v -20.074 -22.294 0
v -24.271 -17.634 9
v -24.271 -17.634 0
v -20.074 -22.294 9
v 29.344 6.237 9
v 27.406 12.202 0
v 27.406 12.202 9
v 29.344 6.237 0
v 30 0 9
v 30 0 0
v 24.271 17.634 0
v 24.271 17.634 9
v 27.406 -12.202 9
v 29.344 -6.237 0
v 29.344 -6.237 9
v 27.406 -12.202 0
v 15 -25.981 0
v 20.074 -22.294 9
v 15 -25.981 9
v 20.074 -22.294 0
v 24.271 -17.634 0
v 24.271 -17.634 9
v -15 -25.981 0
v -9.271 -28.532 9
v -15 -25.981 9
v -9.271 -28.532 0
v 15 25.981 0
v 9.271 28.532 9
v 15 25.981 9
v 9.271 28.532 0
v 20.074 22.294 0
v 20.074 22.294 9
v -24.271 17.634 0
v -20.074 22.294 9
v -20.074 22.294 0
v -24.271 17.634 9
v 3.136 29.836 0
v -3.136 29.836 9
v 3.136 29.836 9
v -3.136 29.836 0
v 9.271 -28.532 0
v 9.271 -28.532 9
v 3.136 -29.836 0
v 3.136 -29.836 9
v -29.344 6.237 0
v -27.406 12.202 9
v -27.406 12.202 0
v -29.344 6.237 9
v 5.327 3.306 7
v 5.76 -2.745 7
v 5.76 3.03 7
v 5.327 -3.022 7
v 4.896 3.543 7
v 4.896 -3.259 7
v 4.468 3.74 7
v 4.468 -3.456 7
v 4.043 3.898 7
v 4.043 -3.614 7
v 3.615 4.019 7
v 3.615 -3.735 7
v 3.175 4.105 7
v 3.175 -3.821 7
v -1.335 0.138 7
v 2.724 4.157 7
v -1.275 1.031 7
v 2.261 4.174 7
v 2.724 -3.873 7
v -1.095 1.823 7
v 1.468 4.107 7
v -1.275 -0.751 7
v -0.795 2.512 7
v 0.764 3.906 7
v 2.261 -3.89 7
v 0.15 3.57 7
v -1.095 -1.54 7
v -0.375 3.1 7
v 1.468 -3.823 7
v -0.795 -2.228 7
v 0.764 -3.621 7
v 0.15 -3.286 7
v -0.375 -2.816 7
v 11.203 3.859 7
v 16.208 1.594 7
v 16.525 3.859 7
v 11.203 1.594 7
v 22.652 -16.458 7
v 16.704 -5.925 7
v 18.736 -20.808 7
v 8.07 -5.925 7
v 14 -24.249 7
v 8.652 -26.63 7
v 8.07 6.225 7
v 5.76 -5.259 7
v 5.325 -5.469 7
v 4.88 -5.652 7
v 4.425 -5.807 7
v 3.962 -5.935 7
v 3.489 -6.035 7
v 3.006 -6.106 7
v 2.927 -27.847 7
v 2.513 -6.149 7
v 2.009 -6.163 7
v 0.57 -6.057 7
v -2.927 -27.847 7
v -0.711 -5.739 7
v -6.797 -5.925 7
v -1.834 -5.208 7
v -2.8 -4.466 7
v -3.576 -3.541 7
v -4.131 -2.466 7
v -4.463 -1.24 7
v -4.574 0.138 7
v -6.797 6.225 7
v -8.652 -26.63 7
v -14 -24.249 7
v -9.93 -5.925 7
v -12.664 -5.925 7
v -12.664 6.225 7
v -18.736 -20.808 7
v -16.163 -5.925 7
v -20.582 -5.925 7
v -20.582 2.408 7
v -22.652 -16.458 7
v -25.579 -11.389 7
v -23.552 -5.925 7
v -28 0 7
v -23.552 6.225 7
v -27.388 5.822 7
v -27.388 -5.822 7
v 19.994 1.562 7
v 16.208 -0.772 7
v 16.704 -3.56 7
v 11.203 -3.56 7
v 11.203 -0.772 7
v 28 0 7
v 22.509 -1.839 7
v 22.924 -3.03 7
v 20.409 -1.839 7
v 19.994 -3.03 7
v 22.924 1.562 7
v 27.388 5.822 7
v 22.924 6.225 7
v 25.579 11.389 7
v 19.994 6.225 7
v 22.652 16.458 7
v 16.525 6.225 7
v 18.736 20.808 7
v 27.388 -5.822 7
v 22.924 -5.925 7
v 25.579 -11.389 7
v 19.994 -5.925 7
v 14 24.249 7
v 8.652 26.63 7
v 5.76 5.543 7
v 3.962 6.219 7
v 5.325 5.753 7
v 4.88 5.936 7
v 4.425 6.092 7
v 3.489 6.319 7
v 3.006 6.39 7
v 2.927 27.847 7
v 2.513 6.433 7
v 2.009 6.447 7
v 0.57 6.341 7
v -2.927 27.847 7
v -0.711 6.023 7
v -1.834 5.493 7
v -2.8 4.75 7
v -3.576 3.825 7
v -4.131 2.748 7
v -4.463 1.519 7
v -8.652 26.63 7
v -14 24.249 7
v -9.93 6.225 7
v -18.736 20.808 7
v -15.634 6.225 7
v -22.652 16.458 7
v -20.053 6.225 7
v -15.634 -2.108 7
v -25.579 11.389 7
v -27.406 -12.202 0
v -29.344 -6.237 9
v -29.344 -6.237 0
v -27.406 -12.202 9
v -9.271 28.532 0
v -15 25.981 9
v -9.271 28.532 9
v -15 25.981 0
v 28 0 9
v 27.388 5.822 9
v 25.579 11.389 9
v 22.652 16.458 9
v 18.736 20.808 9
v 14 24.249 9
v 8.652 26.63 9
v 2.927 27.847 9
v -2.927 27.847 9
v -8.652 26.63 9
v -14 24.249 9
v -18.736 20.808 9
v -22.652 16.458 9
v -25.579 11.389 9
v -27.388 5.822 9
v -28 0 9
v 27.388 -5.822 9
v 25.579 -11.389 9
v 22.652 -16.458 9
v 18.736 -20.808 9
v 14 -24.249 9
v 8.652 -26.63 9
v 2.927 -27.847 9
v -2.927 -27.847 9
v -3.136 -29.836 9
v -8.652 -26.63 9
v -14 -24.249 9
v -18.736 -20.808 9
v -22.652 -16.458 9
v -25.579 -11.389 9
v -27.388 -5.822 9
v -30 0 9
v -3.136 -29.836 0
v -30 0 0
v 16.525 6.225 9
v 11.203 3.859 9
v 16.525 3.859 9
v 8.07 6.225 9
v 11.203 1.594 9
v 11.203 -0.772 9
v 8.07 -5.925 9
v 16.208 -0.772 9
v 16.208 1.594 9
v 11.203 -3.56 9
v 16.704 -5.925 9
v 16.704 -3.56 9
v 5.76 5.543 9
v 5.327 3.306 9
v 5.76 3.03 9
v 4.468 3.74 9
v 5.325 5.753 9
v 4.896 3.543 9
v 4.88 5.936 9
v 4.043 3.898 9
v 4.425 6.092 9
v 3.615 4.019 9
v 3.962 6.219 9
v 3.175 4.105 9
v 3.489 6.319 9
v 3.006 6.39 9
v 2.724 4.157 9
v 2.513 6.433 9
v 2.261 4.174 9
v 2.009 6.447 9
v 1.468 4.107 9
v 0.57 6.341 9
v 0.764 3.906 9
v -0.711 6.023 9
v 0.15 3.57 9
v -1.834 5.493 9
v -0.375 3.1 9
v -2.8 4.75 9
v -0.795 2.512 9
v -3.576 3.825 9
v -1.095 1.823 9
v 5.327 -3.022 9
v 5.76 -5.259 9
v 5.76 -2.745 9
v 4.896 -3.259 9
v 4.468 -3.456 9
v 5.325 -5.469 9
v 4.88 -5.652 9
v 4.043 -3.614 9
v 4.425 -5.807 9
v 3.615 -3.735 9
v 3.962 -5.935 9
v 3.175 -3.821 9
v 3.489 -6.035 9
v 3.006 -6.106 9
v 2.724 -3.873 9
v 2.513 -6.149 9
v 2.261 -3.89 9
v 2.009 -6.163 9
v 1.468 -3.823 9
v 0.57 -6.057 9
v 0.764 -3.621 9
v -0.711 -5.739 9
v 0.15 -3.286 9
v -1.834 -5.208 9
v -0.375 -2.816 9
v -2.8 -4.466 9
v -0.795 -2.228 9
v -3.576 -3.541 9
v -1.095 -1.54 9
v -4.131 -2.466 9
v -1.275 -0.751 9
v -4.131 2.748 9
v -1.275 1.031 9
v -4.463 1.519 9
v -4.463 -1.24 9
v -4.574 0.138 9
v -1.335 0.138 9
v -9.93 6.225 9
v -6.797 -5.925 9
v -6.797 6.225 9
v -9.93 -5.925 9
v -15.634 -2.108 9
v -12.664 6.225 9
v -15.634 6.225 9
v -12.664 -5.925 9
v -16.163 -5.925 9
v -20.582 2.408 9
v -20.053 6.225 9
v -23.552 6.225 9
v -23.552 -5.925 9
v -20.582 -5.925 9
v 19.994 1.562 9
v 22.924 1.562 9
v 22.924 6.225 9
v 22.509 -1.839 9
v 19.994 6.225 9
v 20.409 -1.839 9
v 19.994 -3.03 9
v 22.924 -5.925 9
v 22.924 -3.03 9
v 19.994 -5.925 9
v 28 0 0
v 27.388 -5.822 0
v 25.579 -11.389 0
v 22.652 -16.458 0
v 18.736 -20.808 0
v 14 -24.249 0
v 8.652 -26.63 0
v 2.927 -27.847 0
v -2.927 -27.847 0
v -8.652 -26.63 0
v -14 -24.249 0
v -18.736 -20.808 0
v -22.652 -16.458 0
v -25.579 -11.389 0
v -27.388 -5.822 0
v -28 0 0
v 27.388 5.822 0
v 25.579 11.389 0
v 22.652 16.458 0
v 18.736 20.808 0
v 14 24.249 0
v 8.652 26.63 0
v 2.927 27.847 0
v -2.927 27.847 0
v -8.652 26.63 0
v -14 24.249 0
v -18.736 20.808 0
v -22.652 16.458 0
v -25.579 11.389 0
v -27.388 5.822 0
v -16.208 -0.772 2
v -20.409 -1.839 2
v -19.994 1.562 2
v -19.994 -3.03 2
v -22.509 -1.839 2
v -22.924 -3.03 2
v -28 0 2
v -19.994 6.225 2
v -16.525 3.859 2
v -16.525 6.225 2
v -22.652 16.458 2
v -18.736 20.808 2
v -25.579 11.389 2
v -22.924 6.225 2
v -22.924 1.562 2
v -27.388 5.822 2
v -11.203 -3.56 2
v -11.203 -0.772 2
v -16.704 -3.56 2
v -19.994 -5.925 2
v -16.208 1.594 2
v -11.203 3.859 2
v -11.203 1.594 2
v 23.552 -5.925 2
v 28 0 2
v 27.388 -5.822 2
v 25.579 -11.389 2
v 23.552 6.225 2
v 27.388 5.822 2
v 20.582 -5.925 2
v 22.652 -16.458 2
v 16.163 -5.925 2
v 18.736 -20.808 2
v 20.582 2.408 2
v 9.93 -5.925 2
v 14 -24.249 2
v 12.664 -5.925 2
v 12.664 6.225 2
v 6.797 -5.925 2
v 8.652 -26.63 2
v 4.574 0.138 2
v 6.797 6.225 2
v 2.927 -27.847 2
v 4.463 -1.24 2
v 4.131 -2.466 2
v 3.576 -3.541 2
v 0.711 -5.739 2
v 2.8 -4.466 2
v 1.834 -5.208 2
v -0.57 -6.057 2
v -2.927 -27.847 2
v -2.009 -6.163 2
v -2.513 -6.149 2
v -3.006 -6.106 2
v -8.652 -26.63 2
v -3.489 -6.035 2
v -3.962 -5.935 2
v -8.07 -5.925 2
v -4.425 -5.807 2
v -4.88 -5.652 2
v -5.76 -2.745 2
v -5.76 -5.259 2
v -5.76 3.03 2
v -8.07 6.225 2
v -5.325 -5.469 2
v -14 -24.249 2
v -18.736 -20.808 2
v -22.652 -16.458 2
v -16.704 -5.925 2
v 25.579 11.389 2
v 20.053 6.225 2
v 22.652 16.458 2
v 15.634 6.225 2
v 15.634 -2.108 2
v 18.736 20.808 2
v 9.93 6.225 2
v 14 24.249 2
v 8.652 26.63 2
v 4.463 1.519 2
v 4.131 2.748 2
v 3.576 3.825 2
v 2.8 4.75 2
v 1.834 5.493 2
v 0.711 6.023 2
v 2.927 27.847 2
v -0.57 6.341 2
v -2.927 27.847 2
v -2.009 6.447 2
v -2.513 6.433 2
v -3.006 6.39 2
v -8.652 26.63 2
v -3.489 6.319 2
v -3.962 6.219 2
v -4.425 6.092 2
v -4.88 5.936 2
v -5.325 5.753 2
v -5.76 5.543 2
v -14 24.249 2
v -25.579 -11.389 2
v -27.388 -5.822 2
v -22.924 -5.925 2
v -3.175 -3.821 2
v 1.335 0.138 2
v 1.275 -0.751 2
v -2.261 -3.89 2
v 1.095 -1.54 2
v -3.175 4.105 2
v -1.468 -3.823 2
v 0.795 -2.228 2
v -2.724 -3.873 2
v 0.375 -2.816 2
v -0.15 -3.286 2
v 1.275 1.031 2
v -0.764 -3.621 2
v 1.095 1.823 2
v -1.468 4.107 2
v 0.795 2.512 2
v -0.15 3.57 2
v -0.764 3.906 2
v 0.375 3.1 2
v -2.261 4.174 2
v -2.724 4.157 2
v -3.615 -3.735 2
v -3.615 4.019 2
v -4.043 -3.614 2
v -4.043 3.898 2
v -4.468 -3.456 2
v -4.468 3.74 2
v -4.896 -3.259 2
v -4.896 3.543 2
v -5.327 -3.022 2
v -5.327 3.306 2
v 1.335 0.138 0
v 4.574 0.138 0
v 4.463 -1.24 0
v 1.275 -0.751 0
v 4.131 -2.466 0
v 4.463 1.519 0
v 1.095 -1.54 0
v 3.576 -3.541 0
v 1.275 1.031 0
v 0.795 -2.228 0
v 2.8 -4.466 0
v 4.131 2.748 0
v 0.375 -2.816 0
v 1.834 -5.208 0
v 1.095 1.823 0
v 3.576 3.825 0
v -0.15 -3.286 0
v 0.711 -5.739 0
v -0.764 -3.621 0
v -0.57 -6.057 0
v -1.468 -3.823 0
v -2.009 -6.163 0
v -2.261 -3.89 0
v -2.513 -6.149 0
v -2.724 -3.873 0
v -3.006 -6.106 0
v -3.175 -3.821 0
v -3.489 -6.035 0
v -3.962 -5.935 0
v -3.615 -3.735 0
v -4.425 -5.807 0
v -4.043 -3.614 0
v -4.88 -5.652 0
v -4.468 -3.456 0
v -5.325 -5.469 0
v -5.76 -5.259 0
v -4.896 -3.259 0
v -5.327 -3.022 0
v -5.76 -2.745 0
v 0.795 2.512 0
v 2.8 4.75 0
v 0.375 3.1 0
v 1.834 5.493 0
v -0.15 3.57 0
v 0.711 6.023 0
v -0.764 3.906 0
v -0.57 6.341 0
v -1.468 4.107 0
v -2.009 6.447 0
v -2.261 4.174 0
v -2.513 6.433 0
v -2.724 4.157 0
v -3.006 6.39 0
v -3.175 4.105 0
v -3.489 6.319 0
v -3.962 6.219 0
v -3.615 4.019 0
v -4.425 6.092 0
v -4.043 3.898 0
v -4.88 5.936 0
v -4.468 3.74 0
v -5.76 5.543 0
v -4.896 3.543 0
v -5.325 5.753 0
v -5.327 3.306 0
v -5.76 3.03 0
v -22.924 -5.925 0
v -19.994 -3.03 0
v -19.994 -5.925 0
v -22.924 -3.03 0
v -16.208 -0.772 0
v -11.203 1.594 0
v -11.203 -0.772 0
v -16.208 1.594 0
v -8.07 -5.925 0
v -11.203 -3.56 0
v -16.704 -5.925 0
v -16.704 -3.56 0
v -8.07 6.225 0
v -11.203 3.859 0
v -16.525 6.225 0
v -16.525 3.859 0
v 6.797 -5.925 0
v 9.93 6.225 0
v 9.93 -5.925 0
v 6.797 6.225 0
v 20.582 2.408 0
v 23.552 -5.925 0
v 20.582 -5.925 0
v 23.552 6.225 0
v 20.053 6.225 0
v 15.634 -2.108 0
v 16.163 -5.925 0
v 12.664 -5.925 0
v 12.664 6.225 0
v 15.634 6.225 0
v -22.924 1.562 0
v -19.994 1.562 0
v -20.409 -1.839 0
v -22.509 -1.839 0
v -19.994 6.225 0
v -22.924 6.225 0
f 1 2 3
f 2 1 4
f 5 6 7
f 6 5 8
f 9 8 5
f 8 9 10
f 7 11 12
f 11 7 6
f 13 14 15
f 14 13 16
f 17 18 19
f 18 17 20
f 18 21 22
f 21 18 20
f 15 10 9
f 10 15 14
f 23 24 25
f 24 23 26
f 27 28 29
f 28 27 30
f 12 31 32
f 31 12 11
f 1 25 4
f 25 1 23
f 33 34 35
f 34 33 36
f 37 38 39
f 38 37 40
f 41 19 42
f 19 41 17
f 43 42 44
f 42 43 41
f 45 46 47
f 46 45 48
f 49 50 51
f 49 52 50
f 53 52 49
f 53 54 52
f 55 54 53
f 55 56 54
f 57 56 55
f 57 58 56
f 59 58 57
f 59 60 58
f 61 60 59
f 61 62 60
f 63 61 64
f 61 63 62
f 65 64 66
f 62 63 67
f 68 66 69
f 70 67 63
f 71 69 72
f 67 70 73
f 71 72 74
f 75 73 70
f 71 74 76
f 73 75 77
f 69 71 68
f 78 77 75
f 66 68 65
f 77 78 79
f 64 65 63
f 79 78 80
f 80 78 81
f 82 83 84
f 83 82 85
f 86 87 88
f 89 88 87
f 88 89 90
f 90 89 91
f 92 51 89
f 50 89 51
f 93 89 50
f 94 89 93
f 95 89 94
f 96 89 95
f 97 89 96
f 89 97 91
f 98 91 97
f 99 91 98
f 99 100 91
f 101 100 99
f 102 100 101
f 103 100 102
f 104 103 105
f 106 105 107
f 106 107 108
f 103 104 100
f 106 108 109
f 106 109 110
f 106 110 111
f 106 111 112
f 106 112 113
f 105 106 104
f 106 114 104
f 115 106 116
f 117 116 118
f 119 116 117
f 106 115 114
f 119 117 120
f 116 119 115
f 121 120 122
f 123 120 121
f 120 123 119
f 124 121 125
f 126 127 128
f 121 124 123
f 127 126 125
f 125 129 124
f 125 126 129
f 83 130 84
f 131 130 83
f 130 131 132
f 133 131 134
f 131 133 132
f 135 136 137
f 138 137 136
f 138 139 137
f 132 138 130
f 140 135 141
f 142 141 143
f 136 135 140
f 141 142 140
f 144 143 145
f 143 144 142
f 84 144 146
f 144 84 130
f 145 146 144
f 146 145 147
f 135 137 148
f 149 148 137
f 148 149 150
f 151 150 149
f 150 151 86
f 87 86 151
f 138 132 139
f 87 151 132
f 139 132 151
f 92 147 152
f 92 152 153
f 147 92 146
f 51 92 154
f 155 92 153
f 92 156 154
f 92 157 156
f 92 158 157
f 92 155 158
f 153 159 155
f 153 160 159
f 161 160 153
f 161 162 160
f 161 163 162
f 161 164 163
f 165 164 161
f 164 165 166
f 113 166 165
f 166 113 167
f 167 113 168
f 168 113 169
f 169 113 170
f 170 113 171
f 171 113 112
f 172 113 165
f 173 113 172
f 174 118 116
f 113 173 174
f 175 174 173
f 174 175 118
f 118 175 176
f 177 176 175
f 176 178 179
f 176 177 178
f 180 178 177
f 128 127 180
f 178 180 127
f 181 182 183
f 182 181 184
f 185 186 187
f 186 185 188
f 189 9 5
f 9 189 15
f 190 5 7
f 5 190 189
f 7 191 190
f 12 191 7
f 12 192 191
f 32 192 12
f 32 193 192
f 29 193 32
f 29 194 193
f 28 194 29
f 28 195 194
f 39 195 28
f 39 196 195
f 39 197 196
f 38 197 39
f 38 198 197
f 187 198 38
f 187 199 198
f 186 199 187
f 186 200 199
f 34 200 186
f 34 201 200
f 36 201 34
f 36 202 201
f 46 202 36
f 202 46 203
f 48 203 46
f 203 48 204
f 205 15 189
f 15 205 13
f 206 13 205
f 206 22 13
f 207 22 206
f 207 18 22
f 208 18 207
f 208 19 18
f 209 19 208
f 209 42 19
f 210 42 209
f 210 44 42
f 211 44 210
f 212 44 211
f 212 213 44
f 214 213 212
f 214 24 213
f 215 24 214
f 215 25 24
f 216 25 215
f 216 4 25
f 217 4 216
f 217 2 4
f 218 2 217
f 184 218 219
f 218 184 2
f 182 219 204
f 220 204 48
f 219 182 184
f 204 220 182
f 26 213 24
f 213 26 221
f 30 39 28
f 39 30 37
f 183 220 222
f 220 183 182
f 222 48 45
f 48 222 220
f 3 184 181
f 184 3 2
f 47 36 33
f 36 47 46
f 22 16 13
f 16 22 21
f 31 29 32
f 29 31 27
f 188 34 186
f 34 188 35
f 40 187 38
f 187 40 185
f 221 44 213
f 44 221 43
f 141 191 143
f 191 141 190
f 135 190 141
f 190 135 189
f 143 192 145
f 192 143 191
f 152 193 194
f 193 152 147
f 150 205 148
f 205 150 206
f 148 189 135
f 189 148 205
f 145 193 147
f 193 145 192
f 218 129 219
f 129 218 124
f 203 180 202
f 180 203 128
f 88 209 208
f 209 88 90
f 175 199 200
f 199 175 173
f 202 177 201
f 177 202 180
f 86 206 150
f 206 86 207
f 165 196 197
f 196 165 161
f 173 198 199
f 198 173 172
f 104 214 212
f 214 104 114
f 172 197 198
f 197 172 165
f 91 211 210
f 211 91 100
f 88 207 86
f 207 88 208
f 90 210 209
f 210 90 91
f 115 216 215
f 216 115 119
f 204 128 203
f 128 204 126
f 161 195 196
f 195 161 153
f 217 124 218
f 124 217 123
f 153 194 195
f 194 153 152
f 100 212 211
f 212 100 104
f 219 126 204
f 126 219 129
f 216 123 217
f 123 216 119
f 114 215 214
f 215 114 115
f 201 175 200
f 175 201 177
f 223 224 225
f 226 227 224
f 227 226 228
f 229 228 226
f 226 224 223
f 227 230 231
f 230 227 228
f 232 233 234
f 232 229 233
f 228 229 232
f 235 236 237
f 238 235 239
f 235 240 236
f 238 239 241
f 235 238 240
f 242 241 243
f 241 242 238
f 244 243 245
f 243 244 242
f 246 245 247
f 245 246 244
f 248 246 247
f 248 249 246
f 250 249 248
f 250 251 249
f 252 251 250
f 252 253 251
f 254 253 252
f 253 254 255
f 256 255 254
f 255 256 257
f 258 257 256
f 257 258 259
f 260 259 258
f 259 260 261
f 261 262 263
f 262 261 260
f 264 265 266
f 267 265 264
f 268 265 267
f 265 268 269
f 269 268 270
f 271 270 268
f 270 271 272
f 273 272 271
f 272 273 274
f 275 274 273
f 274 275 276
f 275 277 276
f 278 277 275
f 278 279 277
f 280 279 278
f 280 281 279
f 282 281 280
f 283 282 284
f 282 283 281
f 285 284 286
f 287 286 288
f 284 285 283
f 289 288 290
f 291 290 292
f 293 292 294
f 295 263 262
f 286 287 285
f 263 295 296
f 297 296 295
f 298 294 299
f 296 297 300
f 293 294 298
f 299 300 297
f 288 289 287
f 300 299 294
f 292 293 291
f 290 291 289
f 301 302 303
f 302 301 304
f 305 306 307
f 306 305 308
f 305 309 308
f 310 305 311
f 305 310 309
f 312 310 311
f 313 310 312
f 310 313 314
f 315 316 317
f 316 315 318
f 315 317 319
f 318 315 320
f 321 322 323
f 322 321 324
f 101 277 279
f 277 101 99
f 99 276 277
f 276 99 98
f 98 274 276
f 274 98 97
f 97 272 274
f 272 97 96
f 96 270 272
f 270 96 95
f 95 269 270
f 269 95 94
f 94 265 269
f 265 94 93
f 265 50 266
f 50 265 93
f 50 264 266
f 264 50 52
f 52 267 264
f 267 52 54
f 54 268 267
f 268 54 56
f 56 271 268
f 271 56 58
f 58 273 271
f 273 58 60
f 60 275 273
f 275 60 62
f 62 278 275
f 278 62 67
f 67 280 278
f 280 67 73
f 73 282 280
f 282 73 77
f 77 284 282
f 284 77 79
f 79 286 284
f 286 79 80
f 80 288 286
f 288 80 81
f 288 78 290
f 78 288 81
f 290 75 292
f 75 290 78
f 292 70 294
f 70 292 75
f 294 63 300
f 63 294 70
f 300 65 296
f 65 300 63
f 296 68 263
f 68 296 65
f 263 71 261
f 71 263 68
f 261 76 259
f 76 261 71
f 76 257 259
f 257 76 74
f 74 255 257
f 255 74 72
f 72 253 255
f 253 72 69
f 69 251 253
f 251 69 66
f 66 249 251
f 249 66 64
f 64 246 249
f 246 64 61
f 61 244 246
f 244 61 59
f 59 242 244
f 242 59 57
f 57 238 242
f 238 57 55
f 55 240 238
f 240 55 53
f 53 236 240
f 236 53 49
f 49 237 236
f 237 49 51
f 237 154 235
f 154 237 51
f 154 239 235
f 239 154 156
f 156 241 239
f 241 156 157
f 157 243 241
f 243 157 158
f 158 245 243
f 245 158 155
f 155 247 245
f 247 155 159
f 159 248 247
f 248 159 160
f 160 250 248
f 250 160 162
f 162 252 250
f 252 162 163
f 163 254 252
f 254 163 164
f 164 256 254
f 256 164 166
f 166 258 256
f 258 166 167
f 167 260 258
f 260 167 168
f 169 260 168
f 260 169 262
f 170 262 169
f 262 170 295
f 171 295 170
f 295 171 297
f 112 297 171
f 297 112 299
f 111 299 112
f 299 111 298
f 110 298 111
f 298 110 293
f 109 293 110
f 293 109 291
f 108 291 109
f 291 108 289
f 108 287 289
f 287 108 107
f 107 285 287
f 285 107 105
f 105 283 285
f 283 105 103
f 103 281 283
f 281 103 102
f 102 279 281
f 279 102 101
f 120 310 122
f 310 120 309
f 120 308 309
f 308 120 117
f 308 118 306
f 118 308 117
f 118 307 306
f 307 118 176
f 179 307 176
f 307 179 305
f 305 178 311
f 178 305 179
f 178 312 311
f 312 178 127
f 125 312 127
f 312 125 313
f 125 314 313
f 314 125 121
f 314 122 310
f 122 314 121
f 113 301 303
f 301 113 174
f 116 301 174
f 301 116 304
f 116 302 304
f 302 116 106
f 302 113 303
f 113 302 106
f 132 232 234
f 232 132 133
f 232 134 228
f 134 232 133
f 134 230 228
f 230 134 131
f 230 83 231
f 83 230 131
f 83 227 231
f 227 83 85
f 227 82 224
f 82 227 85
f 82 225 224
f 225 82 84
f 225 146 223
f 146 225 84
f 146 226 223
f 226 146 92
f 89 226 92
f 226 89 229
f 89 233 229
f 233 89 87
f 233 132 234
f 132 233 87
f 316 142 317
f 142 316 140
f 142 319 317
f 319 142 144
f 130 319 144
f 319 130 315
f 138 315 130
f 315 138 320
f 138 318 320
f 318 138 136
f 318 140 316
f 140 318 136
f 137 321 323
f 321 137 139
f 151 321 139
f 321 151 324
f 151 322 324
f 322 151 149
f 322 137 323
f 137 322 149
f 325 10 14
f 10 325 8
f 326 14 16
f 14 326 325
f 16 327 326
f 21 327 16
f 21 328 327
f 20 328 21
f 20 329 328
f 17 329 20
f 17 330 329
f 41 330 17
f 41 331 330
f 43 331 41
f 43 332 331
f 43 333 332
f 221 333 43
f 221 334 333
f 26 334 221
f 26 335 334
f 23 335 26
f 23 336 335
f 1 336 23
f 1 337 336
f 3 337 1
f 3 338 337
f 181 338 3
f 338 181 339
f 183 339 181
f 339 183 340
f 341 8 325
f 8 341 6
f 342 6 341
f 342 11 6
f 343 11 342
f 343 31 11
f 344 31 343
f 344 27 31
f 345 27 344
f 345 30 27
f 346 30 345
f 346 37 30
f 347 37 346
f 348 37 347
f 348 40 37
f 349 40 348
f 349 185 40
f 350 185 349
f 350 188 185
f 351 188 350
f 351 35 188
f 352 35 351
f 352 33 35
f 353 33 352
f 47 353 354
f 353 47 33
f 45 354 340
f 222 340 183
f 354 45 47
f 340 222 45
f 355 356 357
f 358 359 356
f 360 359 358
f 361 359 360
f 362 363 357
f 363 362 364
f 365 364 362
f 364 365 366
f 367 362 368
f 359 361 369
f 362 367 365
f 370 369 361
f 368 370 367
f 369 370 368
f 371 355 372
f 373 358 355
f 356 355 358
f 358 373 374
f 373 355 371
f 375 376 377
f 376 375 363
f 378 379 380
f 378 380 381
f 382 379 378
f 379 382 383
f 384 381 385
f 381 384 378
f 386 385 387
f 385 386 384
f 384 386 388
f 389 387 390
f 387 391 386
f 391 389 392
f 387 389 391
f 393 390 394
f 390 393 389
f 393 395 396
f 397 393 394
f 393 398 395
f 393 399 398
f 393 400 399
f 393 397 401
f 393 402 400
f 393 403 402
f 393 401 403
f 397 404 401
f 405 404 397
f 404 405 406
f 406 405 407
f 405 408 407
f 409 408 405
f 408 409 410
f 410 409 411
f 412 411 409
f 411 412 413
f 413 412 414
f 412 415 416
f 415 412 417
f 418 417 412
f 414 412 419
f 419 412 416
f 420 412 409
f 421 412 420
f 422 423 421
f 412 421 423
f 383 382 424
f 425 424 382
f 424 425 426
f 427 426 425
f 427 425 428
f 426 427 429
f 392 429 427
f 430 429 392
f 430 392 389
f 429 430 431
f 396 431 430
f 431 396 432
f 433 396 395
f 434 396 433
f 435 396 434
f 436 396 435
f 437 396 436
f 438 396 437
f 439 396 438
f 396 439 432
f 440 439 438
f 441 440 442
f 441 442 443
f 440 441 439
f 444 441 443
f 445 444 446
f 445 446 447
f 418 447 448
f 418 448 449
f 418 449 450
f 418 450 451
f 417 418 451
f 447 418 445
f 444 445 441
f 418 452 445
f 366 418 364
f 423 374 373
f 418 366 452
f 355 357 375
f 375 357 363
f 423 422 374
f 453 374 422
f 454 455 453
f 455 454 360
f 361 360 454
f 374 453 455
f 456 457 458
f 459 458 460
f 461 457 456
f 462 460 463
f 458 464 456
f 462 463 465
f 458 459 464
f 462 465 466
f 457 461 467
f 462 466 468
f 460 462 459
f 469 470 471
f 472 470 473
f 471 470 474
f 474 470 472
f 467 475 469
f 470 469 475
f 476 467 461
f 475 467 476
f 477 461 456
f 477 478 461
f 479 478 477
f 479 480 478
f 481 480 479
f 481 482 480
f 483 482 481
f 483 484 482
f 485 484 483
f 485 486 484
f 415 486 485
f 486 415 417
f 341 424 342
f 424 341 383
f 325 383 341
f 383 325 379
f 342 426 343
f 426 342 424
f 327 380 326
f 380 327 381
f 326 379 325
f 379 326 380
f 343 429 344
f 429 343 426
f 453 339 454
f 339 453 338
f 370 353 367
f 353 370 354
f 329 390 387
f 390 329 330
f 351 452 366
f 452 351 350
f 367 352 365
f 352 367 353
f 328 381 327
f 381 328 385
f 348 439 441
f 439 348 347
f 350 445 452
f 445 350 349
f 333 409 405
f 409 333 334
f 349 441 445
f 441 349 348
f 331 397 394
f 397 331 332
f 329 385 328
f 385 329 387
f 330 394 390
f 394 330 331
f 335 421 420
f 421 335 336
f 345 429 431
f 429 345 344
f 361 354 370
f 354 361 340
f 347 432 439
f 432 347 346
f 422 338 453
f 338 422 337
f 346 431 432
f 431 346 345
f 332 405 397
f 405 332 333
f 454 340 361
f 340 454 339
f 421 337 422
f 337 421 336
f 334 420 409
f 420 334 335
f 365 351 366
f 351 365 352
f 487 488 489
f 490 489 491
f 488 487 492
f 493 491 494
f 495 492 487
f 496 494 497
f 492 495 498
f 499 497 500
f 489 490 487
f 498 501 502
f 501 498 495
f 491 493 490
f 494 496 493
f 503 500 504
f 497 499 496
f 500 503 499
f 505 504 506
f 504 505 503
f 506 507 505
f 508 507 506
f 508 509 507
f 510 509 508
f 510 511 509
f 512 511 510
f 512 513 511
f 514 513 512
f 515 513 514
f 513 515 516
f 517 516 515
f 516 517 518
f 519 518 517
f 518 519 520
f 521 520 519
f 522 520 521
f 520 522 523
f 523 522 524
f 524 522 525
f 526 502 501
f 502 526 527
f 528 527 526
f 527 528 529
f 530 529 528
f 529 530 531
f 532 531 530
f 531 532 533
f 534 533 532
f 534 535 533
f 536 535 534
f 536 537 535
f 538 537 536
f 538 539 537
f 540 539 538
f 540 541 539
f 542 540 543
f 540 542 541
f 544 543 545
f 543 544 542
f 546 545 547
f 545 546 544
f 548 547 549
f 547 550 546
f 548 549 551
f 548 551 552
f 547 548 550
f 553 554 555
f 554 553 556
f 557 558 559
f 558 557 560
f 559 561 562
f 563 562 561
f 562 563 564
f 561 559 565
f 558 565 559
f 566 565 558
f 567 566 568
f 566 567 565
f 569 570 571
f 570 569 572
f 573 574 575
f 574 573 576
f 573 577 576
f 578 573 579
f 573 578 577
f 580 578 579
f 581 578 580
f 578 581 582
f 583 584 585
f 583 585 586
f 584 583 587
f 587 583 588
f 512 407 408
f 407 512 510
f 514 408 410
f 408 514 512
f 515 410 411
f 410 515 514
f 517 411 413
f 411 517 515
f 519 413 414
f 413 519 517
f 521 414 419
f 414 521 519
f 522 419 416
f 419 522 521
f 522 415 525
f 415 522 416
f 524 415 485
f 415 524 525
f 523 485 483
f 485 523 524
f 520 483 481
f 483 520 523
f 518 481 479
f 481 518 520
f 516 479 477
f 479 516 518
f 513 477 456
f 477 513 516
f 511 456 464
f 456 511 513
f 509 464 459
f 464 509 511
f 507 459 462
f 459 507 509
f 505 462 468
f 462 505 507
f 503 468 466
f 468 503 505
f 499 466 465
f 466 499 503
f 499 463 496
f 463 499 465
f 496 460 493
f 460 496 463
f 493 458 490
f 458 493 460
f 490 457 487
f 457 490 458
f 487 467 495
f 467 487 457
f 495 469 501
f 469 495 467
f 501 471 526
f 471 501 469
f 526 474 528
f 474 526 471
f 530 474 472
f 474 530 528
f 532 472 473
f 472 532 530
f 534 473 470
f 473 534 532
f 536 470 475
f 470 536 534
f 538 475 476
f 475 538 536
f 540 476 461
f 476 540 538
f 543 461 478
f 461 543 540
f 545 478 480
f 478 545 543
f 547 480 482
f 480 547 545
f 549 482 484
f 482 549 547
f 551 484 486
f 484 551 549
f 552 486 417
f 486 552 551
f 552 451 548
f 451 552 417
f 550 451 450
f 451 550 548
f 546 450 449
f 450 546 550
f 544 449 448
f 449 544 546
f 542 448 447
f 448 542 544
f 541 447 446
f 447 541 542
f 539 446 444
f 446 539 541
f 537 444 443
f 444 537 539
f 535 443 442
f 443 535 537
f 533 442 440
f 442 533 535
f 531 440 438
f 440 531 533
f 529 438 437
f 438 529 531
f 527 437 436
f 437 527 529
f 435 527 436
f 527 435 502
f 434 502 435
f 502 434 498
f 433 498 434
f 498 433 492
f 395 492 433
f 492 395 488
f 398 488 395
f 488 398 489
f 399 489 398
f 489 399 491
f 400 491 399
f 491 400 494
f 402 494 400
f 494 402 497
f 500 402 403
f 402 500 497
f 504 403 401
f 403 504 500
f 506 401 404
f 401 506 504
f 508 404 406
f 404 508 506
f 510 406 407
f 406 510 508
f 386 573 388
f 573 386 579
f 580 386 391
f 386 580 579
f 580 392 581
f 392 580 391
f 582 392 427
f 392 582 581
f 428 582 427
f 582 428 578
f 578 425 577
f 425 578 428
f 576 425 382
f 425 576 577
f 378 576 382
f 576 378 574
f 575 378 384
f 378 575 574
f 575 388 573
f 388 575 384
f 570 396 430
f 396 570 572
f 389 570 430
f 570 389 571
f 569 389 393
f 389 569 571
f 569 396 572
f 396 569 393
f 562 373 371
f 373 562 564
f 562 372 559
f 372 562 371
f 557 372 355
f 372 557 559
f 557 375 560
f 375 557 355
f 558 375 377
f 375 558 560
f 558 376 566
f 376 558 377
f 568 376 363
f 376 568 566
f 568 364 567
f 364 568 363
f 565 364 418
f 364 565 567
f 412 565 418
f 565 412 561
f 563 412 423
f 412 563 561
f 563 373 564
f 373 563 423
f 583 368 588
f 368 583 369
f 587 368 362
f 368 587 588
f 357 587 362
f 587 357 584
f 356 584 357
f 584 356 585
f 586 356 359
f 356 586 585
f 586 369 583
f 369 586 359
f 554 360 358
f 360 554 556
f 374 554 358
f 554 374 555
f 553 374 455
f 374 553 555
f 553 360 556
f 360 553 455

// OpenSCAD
// file: coin-library.scad
module structure
(
    radius,
    structureHeight
)
{
    cylinder
    (
        structureHeight,
        radius,
        radius,
        center = false
    );
}

module bothSurfaceDetails
(
    message,
    positiveText,
    structureHeight,
    detailHeight,
    rimThickness,
    radius,
    textSize
)
{
    //Top
    singleSurfaceDetail
    (
        ZPosition  =  structureHeight,
        positiveText = positiveText,
        message = message,
        detailHeight = detailHeight,
        rimThickness = rimThickness,
        radius = radius,
        textSize = textSize,
        flipped = false
    );

    //Bottom
    singleSurfaceDetail
    (
        ZPosition  =  - detailHeight,
        positiveText = positiveText,
        message = message,
        detailHeight = detailHeight,
        rimThickness = rimThickness,
        radius = radius,
        textSize = textSize,
        flipped = true
    );
}

module rim
(
    position,
    removeInterior,
    detailHeight,
    radius,
    rimThickness
)
{
    difference()
    {
        translate
        (
            position
        )
        {
            cylinder
            (
                detailHeight,
                radius,
                radius,
                center = false
            );
        }

        if(removeInterior)
        {
            translate
            (
                position
            )
            {
                cylinder
                (
                    detailHeight + 1,
                    radius - rimThickness,
                    radius - rimThickness,
                    center = false
                );
            }
        }
    }
}

module textFlipper
(
    position,
    string,
    detailHeight,
    textSize,
    needsFlipping = false
)
{
    if(needsFlipping)
    {
        mirror
        (
            [
                1,
                0,
                0
            ]
        )
        {
            3dtext
            (
                position = position,
                string = string,
                detailHeight = detailHeight,
                textSize = textSize
            );
        }
    }
    else
    {
        3dtext
        (
            position = position,
            string = string,
            detailHeight = detailHeight,
            textSize = textSize
        );
    }
}

module singleSurfaceDetail
(
    ZPosition,
    positiveText,
    message,
    detailHeight,
    rimThickness,
    radius,
    textSize,
    flipped = false
)
{
    position = 
    [
        0,
        0,
        ZPosition
    ];
    if(positiveText)
    {
        rim
        (
            position = position,
            removeInterior = true,
            detailHeight = detailHeight,
            radius = radius,
            rimThickness = rimThickness
        );
        textFlipper
        (
            position = position,
            string = message,
            detailHeight = detailHeight,
            needsFlipping = flipped,
            textSize = textSize
        );
    }
    else
    {
        difference()
        {
            rim
            (
                position = position,
                removeInterior = false,
                detailHeight = detailHeight,
                radius = radius,
                rimThickness = rimThickness
            );
            textFlipper
            (
                position = position,
                string = message,
                detailHeight = detailHeight,
                needsFlipping = flipped,
                textSize = textSize
            );
        }
    }
}

module 3dtext
(
    position,
    string,
    detailHeight,
    textSize
)
{
    translate
    (
        position
    )
    {
        linear_extrude(detailHeight)
        {
            text
            (
                text = string,
                size = textSize,
                font = "Liberation:style=Bold",
                valign = "center",
                halign = "center"
            );
        }
    }
}

module coin
(
    message = "TEST",
    positiveText = true,
    topSurfaceOnly = false,
    radius = 30,
    structureHeight = 5,
    detailHeight = 2,
    rimThickness = 2,
    textSize = 12
)
{
    translate
    (
        [
            0,
            0,
            detailHeight
        ]
    )
    {
        structure
        (
            radius = radius,
            structureHeight = structureHeight
        );

        if(topSurfaceOnly)
        {
            singleSurfaceDetail
            (
                ZPosition = structureHeight,
                positiveText = positiveText,
                message = message,
                detailHeight = detailHeight,
                rimThickness = rimThickness,
                radius = radius,
                textSize = textSize,
                flipped = false
            );
        }
        else
        {
            bothSurfaceDetails
            (
                message = message,
                positiveText = positiveText,
                structureHeight = structureHeight,
                detailHeight = detailHeight,
                rimThickness = rimThickness,
                radius = radius,
                textSize = textSize
            );
        }
    }
}

coin();
// main file
use <coin-library.scad>;

coin
(
    message = "NICE!",
    positiveText = true,
    radius = 30,
    structureHeight = 5,
    detailHeight = 2,
    rimThickness = 2
);
